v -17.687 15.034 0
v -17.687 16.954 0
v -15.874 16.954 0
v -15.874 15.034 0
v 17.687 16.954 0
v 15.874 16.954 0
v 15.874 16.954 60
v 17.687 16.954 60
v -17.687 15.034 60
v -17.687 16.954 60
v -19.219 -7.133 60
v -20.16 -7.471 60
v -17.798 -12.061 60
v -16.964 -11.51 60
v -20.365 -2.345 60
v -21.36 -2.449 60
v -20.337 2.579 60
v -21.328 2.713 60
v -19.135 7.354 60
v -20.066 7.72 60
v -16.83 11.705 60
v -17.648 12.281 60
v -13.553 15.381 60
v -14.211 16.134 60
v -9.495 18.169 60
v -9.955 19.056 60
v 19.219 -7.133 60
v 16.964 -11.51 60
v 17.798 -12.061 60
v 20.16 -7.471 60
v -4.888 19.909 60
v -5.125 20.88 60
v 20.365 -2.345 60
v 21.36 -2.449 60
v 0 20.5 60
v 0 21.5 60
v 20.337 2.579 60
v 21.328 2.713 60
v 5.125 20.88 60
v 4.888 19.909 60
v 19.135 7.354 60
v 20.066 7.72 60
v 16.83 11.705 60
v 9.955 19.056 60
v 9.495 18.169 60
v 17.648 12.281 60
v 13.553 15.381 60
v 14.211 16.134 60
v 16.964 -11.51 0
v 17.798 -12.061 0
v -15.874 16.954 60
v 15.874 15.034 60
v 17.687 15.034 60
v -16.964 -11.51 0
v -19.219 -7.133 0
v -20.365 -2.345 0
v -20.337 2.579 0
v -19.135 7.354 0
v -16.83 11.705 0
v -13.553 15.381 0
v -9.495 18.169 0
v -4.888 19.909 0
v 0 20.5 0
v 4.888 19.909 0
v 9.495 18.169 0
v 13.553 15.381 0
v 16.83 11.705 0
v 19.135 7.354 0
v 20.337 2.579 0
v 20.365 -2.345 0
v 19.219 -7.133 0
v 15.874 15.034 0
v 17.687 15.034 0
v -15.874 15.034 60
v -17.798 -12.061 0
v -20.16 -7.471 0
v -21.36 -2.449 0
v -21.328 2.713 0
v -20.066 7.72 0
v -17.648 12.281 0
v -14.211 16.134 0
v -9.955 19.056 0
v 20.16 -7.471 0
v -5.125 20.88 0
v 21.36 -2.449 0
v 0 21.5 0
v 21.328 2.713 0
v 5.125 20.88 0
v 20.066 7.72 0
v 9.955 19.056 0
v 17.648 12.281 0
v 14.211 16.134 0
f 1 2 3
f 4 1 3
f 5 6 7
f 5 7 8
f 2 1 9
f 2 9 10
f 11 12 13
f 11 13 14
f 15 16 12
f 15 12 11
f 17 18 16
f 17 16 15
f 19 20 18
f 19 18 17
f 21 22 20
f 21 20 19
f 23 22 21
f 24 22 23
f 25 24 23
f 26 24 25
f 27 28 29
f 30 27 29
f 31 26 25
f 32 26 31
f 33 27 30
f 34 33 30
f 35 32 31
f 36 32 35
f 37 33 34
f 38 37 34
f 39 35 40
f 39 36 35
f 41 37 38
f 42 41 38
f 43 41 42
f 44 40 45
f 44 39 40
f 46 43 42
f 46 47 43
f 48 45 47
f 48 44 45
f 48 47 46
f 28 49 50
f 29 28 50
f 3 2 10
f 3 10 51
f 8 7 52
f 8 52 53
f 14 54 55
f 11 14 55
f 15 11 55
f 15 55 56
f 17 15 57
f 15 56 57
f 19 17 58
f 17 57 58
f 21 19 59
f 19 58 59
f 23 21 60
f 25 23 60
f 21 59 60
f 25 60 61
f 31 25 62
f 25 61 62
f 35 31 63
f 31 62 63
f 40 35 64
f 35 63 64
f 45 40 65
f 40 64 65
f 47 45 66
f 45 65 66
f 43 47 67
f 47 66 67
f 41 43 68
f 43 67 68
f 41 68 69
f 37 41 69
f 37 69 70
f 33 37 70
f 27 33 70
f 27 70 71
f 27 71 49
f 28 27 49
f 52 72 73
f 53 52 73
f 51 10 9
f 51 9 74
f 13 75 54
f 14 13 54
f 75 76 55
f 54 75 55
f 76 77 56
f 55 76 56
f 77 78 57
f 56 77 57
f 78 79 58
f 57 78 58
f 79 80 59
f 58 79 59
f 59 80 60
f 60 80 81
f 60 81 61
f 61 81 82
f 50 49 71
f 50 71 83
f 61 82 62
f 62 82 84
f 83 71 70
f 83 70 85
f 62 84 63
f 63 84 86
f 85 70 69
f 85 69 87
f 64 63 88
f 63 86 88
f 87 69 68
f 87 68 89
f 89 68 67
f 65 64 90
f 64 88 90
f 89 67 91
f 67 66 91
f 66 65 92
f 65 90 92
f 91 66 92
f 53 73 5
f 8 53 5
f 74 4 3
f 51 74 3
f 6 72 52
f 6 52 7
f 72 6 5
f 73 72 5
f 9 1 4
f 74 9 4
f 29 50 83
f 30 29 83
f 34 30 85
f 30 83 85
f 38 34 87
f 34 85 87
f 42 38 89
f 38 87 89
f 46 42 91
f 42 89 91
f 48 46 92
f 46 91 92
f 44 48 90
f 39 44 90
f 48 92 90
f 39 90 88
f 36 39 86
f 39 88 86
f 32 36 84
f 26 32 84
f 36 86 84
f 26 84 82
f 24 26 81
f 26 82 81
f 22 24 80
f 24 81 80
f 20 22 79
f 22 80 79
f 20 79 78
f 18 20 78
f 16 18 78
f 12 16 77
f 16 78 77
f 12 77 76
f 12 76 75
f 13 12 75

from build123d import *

# Parameters (mm, degrees)
F1_DEPTH = 60
F0_W     = 1.812323
F0_H     = 1.919401
F2_DEPTH = 60
F3_DEPTH = 60


with BuildPart() as f1:
    # F0 (on Top) → F1 (new body)
    with BuildSketch(Plane.XY):
        with BuildLine():
            ThreePointArc((-16.963577, -11.510303), (0, 20.5), (16.963577, -11.510303))
            Line((16.963577, -11.510303), (17.798148, -12.06134))
            ThreePointArc((17.798148, -12.06134), (0, 21.5), (-17.798148, -12.06134))
            Line((-17.798148, -12.06134), (-16.963577, -11.510303))
        make_face()
    extrude(amount=F1_DEPTH)


with BuildPart() as f2:
    # F0 (on Top) → F2 (new body)
    with BuildSketch(Plane.XY):
        with Locations((-16.78059, 15.994024)):
            Rectangle(F0_W, F0_H)
    extrude(amount=F2_DEPTH)


with BuildPart() as f3:
    # F0 (on Top) → F3 (new body)
    with BuildSketch(Plane.XY):
        with Locations((16.78059, 15.994024)):
            Rectangle(F0_W, F0_H)
    extrude(amount=F3_DEPTH)


solid = Compound([f1.part, f2.part, f3.part])
